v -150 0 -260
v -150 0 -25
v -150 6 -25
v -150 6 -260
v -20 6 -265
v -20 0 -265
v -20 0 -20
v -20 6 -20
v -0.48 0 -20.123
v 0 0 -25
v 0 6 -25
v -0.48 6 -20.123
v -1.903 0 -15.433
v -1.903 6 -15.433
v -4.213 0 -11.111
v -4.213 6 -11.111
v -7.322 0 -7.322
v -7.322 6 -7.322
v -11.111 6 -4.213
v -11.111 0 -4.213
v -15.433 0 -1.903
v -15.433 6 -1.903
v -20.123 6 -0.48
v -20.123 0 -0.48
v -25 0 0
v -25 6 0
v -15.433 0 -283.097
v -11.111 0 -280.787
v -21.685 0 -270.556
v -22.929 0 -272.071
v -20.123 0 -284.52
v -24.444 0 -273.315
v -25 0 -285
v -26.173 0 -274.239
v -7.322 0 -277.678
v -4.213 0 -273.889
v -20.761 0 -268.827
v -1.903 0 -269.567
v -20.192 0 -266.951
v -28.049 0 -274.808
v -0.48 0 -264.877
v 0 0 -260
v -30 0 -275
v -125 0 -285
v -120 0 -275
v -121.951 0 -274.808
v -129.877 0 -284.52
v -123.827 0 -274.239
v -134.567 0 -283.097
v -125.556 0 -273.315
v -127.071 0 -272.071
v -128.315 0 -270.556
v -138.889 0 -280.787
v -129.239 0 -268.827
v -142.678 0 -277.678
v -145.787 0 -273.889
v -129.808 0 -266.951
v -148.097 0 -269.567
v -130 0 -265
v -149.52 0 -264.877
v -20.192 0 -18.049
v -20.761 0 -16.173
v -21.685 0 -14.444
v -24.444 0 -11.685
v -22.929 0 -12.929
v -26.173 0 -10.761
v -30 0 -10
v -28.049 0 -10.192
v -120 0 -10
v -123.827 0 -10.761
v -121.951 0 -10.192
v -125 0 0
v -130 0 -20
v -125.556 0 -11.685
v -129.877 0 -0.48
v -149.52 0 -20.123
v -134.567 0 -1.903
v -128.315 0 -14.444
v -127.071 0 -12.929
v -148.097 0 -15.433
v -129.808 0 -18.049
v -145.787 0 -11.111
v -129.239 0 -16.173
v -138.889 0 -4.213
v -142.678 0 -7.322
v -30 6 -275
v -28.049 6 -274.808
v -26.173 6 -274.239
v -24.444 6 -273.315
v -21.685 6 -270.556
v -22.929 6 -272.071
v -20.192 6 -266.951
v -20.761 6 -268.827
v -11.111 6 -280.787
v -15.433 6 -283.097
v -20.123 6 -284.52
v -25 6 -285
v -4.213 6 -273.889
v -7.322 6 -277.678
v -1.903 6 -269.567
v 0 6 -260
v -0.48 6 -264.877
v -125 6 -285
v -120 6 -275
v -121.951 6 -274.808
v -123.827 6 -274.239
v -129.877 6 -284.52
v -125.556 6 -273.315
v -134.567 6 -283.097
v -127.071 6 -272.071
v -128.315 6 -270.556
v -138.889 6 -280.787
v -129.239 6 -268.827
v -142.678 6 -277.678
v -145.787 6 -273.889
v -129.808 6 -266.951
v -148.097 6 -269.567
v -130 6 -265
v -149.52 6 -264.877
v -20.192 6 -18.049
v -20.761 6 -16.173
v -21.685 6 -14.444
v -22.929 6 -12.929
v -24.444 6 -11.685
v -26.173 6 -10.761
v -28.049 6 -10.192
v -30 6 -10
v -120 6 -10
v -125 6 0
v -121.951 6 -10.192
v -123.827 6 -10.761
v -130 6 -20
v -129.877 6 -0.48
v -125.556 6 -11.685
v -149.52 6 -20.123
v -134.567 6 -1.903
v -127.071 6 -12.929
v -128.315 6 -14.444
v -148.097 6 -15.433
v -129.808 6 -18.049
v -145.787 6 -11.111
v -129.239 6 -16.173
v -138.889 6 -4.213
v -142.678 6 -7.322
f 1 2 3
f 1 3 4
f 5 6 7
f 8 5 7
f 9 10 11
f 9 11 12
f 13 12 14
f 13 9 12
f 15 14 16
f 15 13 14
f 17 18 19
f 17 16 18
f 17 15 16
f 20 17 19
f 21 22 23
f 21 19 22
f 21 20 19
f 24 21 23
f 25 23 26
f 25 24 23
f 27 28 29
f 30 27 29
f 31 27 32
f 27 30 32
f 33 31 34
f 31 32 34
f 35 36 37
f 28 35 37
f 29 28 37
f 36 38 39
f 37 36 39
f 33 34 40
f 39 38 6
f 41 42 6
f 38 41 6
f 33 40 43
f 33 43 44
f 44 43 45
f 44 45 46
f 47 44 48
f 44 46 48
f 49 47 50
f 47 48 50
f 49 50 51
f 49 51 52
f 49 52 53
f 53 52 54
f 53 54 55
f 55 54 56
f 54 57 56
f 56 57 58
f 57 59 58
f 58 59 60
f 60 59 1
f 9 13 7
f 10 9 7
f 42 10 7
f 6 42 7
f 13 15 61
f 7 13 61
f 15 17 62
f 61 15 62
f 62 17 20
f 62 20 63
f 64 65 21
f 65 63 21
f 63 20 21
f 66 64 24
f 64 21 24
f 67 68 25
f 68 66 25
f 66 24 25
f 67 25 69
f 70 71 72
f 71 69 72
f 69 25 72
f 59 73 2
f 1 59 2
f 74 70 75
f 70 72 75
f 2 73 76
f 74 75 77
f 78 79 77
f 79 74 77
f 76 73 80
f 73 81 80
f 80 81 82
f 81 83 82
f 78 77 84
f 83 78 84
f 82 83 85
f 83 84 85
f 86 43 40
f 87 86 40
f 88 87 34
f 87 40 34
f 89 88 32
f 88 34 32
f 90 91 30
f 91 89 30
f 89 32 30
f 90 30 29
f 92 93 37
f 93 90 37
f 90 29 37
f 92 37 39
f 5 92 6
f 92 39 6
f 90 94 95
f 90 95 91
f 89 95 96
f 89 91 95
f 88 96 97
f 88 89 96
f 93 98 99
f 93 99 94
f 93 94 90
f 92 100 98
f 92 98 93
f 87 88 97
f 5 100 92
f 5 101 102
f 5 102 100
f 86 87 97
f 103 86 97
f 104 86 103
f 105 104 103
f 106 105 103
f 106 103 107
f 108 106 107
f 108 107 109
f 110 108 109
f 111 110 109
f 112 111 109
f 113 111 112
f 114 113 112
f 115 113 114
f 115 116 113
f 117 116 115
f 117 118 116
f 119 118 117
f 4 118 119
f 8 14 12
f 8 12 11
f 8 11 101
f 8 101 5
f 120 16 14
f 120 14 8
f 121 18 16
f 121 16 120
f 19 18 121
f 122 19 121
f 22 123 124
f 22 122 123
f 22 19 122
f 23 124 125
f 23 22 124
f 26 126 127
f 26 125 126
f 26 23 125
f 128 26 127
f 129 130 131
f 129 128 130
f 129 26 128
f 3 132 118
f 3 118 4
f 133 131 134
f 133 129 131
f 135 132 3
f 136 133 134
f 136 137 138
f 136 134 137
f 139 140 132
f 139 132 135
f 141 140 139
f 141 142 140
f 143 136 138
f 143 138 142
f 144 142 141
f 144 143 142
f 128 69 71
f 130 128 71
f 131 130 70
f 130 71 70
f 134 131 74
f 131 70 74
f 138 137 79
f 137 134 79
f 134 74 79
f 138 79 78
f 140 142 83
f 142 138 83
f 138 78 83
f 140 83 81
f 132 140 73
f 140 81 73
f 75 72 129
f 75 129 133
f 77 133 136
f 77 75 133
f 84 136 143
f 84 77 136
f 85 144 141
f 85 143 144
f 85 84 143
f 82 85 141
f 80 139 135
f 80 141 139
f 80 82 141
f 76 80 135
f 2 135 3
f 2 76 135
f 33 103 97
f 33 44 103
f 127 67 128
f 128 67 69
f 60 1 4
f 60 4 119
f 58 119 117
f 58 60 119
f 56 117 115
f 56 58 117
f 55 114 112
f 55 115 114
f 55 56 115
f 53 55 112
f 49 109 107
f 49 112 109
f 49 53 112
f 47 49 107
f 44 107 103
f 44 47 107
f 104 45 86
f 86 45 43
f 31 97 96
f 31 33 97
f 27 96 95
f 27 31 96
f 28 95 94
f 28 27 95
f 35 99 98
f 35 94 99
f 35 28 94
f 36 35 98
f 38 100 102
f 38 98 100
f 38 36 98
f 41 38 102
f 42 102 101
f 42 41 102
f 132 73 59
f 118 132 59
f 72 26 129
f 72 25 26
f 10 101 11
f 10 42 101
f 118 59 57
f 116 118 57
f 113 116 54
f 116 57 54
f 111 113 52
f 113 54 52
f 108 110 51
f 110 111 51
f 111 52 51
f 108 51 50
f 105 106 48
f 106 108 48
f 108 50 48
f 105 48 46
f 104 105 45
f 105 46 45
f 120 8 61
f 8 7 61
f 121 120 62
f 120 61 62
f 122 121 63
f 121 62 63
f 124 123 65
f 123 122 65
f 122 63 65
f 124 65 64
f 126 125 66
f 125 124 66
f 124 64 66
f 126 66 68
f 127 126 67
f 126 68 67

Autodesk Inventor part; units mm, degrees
ref_plane "YZ Plane" through (0, 0, 0) normal (1, 0, 0) x (0, 1, 0)
ref_plane "XZ Plane" through (0, 0, 0) normal (0, 1, 0) x (-1, 0, 0)
ref_plane "XY Plane" through (0, 0, 0) normal (0, 0, 1) x (1, 0, 0)
sketch "Esquisse1" plane through (0, 0, 0) normal (0, 1, 0) x (-1, 0, 0)
  line L0 (25, 0) -> (125, 0)
  line L1 (150, -25) -> (150, -260)
  line L2 (125, -285) -> (25, -285)
  line L3 (0, -260) -> (0, -25)
  line L4 (20, 0) -> (20, -10) construction
  line L5 (20, -10) -> (0, -10) construction
  line L6 (150, 0) -> (0, -285) construction
  line L7 (150, -285) -> (0, 0) construction
  line L8 (75, 0) -> (75, -285) construction
  line L9 (150, -142.5) -> (0, -142.5) construction
  line L10 (30, -10) -> (120, -10)
  line L11 (130, -20) -> (130, -265)
  line L12 (120, -275) -> (30, -275)
  line L13 (20, -265) -> (20, -20)
  line L14 (130, -275) -> (150, -275) construction
  line L15 (130, -275) -> (130, -285) construction
  arc A0 (120, -275) -> (130, -265) centre (120, -265) ccw
  arc A1 (20, -265) -> (30, -275) centre (30, -265) ccw
  arc A2 (30, -10) -> (20, -20) centre (30, -20) ccw
  arc A3 (130, -20) -> (120, -10) centre (120, -20) ccw
  arc A4 (25, 0) -> (0, -25) centre (25, -25) ccw
  arc A5 (150, -25) -> (125, 0) centre (125, -25) ccw
  arc A6 (125, -285) -> (150, -260) centre (125, -260) ccw
  arc A7 (0, -260) -> (25, -285) centre (25, -260) ccw
  point P0 (150, -10)
  point P1 (148, 0)
  point P2 (0, -10)
  point P3 (10, 0)
  point P4 (0, -283)
  point P5 (2, -285)
  point P6 (140, -285)
  point P7 (150, -283)
  dimension "d0" = 150
  dimension "d5" = 20
  dimension "d11" = 10
  dimension "d13" = 10
  dimension "d14" = 265
  dimension "d15" = 25
extrude "Extrusion1" add sketch "Esquisse1" along normal blind 6
properties part number "top" material "Bois (cerisier)"
